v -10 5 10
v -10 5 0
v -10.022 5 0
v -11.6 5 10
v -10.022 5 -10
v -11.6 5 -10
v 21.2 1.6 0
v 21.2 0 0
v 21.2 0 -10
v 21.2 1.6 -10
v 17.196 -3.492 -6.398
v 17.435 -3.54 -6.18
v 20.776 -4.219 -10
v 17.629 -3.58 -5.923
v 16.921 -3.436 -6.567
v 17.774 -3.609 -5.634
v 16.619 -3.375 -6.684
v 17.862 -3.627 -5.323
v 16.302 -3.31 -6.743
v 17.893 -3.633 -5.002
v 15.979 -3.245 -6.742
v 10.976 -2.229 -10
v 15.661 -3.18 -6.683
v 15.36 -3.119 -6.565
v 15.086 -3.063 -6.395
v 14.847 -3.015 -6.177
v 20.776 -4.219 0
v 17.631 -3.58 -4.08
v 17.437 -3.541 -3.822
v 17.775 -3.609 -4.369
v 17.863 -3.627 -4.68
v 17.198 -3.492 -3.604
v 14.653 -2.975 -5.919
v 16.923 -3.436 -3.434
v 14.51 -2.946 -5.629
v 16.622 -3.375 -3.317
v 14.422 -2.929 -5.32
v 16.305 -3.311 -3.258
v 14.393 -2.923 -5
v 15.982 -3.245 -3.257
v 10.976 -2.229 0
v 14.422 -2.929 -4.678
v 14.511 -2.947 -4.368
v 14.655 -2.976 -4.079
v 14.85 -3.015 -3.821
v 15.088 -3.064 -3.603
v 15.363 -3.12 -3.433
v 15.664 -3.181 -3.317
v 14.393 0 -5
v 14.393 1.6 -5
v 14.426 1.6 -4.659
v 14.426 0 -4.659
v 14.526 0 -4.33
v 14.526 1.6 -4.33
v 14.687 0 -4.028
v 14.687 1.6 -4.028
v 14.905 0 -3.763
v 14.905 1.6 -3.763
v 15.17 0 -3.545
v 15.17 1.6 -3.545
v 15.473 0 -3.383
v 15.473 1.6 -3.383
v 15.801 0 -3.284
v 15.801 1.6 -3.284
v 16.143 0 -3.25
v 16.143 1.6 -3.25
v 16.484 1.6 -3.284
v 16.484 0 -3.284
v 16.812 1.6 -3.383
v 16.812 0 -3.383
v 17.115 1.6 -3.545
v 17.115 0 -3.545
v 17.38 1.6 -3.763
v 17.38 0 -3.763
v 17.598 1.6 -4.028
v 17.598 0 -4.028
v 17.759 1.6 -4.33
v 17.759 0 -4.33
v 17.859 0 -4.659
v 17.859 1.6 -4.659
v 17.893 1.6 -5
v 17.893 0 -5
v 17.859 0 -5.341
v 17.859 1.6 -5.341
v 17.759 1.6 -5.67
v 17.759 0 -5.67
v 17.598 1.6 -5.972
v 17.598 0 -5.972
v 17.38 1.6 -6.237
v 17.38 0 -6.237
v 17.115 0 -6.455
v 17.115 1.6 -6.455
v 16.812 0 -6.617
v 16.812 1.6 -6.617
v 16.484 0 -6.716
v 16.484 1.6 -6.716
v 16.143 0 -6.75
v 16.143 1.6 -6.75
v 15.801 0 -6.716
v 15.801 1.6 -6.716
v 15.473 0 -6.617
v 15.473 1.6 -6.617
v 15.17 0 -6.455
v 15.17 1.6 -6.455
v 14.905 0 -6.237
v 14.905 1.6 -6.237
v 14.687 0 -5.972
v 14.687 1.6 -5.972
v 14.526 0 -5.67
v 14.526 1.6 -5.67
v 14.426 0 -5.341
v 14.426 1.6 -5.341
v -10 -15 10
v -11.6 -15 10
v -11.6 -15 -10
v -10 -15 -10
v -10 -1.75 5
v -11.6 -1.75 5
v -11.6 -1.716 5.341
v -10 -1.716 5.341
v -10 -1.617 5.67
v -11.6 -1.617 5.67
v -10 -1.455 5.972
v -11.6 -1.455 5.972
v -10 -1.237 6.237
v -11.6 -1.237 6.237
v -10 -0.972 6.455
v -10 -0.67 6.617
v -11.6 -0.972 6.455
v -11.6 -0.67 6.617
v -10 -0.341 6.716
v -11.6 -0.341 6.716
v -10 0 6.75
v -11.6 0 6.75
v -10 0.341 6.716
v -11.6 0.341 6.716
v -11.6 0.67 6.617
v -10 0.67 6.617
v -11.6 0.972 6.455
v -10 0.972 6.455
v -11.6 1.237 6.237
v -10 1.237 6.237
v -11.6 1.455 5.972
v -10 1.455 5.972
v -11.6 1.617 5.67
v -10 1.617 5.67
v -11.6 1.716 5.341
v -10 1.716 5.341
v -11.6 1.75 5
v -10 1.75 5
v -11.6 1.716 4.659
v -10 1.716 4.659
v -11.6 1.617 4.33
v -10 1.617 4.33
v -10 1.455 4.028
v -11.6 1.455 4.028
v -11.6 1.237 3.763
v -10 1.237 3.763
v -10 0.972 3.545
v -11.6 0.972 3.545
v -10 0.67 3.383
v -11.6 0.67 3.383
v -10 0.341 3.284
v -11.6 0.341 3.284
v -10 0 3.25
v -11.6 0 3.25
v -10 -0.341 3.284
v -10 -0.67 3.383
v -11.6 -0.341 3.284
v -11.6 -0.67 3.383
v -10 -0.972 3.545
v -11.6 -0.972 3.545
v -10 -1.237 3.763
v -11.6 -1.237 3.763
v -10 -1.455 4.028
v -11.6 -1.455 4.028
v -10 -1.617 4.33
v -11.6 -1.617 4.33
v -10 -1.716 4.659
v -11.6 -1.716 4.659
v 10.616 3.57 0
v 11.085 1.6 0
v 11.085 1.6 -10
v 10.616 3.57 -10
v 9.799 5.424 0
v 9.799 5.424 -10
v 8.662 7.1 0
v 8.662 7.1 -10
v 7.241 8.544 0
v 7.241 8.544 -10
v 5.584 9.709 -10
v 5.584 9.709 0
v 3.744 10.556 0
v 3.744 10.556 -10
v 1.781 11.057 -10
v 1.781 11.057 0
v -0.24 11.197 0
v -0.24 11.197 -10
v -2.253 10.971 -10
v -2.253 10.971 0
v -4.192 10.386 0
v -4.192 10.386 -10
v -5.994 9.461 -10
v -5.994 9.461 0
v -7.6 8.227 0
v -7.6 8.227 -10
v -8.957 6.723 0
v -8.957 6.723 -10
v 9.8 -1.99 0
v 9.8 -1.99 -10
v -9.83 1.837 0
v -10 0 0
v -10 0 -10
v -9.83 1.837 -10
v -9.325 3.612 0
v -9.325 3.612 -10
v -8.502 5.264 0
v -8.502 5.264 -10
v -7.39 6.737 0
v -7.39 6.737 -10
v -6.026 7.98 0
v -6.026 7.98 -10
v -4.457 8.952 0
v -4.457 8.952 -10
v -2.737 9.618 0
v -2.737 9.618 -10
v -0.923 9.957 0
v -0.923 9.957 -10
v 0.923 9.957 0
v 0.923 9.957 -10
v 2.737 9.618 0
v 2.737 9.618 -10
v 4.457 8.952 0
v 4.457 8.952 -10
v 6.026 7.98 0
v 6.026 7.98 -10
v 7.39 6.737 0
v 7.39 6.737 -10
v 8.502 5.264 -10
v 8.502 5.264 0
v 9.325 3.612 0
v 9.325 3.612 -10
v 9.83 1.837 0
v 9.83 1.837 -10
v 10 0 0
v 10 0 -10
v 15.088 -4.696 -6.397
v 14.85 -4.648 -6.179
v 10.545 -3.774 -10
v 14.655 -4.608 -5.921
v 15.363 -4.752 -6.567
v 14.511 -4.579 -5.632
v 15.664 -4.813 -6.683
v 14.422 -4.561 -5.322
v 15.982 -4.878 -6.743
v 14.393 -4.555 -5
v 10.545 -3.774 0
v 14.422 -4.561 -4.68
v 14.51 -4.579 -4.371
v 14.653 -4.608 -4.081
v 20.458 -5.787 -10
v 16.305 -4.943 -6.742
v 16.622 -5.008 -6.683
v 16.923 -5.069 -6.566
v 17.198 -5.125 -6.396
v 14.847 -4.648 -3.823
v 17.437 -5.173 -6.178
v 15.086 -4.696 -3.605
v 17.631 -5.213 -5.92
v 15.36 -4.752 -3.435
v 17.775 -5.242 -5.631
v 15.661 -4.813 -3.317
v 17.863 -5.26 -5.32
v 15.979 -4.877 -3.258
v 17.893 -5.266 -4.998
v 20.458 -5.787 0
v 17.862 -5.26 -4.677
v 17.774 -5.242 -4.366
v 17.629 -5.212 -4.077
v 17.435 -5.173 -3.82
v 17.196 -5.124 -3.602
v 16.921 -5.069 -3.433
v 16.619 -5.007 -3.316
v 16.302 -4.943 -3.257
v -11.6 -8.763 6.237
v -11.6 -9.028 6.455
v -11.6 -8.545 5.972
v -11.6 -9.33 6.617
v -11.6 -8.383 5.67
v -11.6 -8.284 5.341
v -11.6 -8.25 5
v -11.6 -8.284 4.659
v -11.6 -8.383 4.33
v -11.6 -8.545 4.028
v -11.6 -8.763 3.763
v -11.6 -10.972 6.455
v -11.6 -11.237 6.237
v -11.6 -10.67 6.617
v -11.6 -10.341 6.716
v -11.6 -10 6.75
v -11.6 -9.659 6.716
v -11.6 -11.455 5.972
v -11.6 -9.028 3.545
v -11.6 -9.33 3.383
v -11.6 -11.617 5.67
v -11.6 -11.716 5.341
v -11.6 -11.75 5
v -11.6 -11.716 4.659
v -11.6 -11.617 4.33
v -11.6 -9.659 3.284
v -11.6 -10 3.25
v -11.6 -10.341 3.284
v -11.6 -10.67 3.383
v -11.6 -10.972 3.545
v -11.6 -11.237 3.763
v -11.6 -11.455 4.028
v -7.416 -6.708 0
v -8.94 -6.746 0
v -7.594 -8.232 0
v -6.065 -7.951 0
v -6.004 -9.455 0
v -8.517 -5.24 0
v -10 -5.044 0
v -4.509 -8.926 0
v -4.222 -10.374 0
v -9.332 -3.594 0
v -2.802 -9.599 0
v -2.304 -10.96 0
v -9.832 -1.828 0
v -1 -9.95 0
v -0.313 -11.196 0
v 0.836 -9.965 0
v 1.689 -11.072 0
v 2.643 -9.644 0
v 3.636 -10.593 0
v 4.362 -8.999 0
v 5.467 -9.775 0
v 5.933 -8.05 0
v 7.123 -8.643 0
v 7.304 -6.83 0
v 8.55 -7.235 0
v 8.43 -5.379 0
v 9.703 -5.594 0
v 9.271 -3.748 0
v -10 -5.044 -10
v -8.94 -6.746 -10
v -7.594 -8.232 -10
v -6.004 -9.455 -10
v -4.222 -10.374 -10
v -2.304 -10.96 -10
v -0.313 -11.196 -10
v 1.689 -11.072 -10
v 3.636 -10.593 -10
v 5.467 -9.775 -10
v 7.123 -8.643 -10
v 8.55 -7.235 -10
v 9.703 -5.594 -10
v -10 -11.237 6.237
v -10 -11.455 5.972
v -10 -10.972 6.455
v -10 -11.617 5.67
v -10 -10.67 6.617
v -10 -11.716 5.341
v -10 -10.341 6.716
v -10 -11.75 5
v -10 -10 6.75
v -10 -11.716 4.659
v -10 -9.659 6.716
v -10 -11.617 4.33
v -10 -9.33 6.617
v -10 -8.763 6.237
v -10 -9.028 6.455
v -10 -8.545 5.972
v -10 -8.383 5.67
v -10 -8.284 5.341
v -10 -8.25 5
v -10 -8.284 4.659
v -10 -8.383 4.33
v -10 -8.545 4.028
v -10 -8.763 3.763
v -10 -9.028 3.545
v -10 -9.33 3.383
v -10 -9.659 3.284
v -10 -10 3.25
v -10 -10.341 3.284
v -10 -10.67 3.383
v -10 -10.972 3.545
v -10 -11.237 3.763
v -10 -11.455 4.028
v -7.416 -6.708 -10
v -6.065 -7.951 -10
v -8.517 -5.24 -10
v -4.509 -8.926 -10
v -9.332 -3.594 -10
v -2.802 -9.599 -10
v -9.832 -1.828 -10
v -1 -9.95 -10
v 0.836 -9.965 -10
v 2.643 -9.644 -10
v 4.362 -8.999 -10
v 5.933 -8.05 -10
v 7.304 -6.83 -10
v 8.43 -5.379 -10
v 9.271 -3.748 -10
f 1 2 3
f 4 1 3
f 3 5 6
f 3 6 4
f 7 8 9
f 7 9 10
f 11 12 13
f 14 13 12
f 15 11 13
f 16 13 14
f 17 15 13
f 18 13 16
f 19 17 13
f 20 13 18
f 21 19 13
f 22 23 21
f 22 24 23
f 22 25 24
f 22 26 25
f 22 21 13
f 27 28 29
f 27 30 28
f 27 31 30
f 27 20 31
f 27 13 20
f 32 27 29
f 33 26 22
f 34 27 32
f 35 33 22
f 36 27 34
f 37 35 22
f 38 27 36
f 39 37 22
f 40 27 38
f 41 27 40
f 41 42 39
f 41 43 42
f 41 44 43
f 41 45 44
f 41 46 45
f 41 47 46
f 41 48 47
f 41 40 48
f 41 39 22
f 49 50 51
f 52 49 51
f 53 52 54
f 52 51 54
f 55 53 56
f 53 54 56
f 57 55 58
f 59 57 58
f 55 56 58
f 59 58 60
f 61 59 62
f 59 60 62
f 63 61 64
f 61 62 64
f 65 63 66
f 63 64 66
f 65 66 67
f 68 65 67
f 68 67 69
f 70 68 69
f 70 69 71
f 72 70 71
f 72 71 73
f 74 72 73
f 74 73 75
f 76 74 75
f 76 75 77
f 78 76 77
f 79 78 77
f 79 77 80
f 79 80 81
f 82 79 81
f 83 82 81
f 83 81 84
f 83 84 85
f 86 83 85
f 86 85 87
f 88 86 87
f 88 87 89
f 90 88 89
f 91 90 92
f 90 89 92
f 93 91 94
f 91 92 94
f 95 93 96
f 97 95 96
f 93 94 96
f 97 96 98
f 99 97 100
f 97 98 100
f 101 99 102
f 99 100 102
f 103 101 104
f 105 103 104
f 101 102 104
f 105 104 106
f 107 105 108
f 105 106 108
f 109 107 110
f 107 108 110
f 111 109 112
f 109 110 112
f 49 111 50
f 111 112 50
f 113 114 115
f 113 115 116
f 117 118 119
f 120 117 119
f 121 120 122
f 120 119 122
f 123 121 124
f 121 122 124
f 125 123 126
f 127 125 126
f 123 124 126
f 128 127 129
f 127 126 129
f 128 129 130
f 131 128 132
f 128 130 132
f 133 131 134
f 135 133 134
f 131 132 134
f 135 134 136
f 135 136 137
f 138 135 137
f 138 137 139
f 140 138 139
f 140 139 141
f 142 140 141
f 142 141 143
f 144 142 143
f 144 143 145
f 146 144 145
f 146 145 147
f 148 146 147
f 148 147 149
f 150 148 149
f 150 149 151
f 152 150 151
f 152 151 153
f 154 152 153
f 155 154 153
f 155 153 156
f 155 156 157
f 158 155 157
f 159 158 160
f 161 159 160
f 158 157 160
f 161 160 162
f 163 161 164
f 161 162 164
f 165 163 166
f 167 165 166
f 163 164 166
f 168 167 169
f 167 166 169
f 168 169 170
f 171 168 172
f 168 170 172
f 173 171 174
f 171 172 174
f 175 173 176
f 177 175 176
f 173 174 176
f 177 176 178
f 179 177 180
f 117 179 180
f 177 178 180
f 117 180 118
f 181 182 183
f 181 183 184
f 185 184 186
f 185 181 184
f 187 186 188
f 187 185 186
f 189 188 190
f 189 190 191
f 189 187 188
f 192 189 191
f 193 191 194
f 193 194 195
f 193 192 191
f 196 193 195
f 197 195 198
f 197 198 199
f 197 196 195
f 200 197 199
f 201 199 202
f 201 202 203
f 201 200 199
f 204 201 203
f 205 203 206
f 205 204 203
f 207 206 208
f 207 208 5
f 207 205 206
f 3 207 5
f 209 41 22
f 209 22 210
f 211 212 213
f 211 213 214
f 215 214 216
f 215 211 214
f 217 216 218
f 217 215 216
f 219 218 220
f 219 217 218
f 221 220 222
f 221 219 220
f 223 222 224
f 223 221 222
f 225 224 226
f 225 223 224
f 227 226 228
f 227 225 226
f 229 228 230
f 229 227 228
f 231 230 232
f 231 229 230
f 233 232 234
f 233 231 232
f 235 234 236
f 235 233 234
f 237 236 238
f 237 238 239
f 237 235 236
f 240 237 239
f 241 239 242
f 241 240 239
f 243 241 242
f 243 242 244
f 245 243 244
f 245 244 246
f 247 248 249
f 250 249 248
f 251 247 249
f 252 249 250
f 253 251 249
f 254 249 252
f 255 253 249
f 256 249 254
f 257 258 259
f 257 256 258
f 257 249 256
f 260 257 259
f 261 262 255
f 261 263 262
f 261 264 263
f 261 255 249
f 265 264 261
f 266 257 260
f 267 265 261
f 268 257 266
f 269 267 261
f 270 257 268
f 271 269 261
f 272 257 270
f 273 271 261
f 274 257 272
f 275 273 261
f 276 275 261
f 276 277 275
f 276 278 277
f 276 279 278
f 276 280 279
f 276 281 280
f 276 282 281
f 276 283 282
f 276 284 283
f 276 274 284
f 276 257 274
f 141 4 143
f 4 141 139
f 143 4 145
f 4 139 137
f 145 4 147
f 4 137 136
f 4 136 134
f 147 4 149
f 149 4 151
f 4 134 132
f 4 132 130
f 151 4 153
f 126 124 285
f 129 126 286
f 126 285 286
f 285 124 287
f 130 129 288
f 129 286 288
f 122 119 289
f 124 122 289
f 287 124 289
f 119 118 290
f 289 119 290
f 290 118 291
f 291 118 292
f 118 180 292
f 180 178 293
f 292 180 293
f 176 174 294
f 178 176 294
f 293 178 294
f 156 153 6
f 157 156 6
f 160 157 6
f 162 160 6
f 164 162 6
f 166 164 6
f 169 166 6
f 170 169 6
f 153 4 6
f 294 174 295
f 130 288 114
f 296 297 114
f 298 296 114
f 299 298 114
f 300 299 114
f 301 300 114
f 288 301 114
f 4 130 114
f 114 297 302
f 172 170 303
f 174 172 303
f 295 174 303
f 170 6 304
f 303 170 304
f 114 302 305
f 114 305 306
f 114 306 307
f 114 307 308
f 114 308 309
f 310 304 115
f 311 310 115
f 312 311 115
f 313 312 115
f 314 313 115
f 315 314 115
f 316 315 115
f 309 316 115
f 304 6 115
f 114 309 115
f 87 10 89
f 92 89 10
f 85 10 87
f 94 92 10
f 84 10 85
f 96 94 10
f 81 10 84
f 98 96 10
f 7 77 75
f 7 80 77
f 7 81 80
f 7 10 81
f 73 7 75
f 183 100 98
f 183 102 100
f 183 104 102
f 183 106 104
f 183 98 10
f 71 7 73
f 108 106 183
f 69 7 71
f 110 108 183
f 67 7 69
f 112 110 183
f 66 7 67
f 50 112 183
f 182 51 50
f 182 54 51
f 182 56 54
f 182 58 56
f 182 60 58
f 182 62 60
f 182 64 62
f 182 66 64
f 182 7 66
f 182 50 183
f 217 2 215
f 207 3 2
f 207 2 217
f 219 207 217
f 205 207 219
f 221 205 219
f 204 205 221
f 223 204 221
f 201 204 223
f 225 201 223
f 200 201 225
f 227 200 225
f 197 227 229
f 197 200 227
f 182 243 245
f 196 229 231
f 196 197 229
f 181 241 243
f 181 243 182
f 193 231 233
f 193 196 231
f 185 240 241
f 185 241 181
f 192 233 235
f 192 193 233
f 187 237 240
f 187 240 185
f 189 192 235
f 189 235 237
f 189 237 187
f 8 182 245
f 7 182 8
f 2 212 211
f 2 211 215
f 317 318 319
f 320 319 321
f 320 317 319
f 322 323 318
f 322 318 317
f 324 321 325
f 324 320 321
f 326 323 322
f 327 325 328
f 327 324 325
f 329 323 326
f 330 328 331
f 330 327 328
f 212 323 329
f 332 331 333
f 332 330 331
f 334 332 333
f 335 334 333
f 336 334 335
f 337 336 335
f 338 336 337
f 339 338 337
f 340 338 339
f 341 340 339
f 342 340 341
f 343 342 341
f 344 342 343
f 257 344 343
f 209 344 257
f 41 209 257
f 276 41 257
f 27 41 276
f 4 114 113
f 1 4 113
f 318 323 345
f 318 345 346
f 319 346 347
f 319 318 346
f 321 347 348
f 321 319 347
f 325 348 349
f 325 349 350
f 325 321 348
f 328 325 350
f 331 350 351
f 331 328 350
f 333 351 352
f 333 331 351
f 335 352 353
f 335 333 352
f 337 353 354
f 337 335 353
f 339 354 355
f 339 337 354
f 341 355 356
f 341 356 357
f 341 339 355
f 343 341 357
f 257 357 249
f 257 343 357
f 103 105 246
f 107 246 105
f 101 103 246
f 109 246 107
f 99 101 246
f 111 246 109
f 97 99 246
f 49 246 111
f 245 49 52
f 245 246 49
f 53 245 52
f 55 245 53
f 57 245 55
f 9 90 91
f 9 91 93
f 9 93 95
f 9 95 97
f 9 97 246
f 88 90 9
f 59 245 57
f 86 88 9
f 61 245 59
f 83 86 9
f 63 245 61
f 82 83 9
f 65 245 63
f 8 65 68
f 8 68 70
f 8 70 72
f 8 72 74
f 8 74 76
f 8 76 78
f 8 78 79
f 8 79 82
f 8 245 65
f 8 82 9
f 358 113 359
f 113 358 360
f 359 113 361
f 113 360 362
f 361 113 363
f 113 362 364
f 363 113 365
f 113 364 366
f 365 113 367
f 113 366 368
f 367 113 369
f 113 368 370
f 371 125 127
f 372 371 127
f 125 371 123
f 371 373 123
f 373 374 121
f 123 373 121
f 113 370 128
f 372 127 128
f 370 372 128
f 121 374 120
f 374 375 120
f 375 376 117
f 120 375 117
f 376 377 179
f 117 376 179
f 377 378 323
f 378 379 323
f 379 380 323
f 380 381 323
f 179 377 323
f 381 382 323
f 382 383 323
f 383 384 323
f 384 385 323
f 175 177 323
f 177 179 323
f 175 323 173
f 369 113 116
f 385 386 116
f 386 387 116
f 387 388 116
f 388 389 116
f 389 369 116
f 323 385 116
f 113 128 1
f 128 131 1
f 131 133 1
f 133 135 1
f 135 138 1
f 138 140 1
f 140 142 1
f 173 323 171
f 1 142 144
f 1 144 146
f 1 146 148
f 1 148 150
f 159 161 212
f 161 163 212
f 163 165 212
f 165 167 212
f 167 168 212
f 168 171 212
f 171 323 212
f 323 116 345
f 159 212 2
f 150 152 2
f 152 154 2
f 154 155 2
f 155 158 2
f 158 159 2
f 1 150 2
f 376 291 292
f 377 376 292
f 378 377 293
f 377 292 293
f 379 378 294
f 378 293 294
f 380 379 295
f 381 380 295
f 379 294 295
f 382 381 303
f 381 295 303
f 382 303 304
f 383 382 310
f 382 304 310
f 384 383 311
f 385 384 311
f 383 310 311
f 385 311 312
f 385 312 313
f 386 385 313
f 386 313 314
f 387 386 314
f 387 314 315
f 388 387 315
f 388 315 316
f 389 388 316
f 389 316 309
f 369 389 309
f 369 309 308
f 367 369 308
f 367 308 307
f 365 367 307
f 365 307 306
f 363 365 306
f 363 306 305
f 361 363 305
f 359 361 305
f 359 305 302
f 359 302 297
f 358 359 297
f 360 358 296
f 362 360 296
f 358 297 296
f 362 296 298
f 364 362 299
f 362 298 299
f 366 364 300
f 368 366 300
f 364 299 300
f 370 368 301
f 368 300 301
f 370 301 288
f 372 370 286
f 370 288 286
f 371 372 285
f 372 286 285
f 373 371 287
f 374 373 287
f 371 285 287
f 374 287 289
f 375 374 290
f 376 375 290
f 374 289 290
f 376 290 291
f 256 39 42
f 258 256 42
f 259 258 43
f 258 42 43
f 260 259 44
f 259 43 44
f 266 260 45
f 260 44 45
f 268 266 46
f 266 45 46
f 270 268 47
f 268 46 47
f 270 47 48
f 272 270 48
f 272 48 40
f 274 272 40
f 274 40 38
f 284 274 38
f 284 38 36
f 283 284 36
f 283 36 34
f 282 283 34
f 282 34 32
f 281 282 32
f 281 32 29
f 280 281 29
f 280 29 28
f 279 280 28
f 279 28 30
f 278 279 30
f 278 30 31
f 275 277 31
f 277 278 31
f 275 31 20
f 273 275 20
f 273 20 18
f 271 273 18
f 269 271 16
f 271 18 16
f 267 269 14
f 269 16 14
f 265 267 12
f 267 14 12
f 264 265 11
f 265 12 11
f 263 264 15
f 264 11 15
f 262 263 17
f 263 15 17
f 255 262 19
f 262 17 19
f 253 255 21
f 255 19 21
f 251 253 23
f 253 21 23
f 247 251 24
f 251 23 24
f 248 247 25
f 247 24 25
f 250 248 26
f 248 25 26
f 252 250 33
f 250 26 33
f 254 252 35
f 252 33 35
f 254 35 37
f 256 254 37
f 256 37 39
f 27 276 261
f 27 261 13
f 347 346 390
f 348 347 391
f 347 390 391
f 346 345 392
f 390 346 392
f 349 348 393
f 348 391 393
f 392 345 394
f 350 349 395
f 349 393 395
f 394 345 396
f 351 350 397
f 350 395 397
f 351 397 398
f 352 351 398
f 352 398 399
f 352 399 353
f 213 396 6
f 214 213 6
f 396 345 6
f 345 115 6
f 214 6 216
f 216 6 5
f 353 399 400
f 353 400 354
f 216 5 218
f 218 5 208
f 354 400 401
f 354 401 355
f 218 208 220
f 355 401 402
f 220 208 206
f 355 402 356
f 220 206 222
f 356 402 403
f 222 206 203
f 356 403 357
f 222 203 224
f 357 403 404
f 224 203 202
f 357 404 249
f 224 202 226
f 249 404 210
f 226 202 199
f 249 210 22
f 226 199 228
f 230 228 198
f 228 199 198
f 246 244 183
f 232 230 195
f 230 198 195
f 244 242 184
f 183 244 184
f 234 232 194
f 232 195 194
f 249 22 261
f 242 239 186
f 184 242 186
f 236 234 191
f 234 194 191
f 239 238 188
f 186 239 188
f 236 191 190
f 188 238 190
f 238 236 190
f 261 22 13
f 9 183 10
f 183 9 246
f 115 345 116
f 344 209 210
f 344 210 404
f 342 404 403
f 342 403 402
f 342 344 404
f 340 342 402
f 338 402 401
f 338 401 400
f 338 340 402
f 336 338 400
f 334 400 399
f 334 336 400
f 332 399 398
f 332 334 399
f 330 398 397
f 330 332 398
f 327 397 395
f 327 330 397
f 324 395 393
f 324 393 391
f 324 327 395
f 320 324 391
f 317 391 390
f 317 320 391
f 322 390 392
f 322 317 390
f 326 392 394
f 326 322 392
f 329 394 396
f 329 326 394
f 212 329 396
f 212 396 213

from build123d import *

# Parameters (mm, degrees)
F1_DEPTH = 10
F2_DEPTH = 10
F3_R     = 1.75
F4_DEPTH = 25
F5_R     = 1.75
F6_DEPTH = 25


with BuildPart() as f1:
    # F0 (on Top) → F1 (new body)
    with BuildSketch(Plane.XY):
        with BuildLine():
            Line((10.976, -2.2287718591), (9.8, -1.9899748742))
            ThreePointArc((9.8, -1.9899748742), (-0.999999957, -9.9498743754), (-10, -8.64e-08))
            Line((-10, -8.64e-08), (-10, -5.0438080852))
            ThreePointArc((-10, -5.0438080852), (0.6909576709, -11.178666177), (10.5450266852, -3.7739120563))
            ThreePointArc((10.5450266852, -3.7739120563), (10.7882117125, -3.0090676374), (10.976, -2.2287718591))
        make_face()
        with BuildLine():
            Line((-10, 5), (-10, -8.64e-08))
            ThreePointArc((-10, -8.64e-08), (-4.32e-08, 10), (10, 0))
            Line((10, 0), (11.2, 0))
            ThreePointArc((11.2, 0), (11.1712443776, 0.8020592601), (11.0851251684, 1.6))
            ThreePointArc((11.0851251684, 1.6), (1.781171417, 11.0574603044), (-10.0219758531, 5))
            Line((-10.0219758531, 5), (-10, 5))
        make_face()
        with BuildLine():
            Line((-10, -5.0438080852), (-10, -8.64e-08))
            Line((-10, -8.64e-08), (-10, 5))
            Line((-10, 5), (-10.0219758531, 5))
            ThreePointArc((-10.0219758531, 5), (-11.199973191, -0.0245055425), (-10, -5.0438080852))
        make_face()
        with BuildLine():
            Line((20.776, -4.2187467333), (10.976, -2.2287718591))
            ThreePointArc((10.976, -2.2287718591), (10.7882117125, -3.0090676374), (10.5450266852, -3.7739120563))
            Line((10.5450266852, -3.7739120563), (20.4576040201, -5.7867467333))
            Line((20.4576040201, -5.7867467333), (20.776, -4.2187467333))
        make_face()
        with BuildLine():
            Line((-10, -15), (-10, -5.0438080852))
            ThreePointArc((-10, -5.0438080852), (-11.199973191, -0.0245055425), (-10.0219758531, 5))
            Line((-10.0219758531, 5), (-11.6, 5))
            Line((-11.6, 5), (-11.6, -15))
            Line((-11.6, -15), (-10, -15))
        make_face()
        with BuildLine():
            ThreePointArc((11.0851251684, 1.6), (11.1712443776, 0.8020592601), (11.2, 0))
            Line((11.2, 0), (21.2, 0))
            Line((21.2, 0), (21.2, 1.6))
            Line((21.2, 1.6), (11.0851251684, 1.6))
        make_face()
    extrude(amount=-F1_DEPTH)

    # F0 (on Top) → F2 (join)
    with BuildSketch(Plane.XY):
        with BuildLine():
            Line((-10, -15), (-10, -5.0438080852))
            ThreePointArc((-10, -5.0438080852), (-11.199973191, -0.0245055425), (-10.0219758531, 5))
            Line((-10.0219758531, 5), (-11.6, 5))
            Line((-11.6, 5), (-11.6, -15))
            Line((-11.6, -15), (-10, -15))
        make_face()
        with BuildLine():
            Line((-10, -5.0438080852), (-10, -8.64e-08))
            Line((-10, -8.64e-08), (-10, 5))
            Line((-10, 5), (-10.0219758531, 5))
            ThreePointArc((-10.0219758531, 5), (-11.199973191, -0.0245055425), (-10, -5.0438080852))
        make_face()
    extrude(amount=F2_DEPTH)

    # F3 (on face) → F4 (cut)
    with BuildSketch(Plane(origin=(-11.6, 0, 0), x_dir=(0, -1, 0), z_dir=(-1, 0, 0))):
        with Locations((0, 5)):
            Circle(F3_R)
        with BuildLine():
            ThreePointArc((11.75, 5), (10, 6.75), (8.25, 5))
            ThreePointArc((8.25, 5), (10, 3.25), (11.75, 5))
        make_face()
    extrude(amount=-F4_DEPTH, mode=Mode.SUBTRACT)

    # F5 (on face) → F6 (cut)
    with BuildSketch(Plane(origin=(0, 1.6, 0), x_dir=(-1, 0, 0), z_dir=(0, 1, 0))):
        with Locations((-16.1425625842, -5)):
            Circle(F5_R)
    extrude(amount=-F6_DEPTH, mode=Mode.SUBTRACT)


solid = f1.part
